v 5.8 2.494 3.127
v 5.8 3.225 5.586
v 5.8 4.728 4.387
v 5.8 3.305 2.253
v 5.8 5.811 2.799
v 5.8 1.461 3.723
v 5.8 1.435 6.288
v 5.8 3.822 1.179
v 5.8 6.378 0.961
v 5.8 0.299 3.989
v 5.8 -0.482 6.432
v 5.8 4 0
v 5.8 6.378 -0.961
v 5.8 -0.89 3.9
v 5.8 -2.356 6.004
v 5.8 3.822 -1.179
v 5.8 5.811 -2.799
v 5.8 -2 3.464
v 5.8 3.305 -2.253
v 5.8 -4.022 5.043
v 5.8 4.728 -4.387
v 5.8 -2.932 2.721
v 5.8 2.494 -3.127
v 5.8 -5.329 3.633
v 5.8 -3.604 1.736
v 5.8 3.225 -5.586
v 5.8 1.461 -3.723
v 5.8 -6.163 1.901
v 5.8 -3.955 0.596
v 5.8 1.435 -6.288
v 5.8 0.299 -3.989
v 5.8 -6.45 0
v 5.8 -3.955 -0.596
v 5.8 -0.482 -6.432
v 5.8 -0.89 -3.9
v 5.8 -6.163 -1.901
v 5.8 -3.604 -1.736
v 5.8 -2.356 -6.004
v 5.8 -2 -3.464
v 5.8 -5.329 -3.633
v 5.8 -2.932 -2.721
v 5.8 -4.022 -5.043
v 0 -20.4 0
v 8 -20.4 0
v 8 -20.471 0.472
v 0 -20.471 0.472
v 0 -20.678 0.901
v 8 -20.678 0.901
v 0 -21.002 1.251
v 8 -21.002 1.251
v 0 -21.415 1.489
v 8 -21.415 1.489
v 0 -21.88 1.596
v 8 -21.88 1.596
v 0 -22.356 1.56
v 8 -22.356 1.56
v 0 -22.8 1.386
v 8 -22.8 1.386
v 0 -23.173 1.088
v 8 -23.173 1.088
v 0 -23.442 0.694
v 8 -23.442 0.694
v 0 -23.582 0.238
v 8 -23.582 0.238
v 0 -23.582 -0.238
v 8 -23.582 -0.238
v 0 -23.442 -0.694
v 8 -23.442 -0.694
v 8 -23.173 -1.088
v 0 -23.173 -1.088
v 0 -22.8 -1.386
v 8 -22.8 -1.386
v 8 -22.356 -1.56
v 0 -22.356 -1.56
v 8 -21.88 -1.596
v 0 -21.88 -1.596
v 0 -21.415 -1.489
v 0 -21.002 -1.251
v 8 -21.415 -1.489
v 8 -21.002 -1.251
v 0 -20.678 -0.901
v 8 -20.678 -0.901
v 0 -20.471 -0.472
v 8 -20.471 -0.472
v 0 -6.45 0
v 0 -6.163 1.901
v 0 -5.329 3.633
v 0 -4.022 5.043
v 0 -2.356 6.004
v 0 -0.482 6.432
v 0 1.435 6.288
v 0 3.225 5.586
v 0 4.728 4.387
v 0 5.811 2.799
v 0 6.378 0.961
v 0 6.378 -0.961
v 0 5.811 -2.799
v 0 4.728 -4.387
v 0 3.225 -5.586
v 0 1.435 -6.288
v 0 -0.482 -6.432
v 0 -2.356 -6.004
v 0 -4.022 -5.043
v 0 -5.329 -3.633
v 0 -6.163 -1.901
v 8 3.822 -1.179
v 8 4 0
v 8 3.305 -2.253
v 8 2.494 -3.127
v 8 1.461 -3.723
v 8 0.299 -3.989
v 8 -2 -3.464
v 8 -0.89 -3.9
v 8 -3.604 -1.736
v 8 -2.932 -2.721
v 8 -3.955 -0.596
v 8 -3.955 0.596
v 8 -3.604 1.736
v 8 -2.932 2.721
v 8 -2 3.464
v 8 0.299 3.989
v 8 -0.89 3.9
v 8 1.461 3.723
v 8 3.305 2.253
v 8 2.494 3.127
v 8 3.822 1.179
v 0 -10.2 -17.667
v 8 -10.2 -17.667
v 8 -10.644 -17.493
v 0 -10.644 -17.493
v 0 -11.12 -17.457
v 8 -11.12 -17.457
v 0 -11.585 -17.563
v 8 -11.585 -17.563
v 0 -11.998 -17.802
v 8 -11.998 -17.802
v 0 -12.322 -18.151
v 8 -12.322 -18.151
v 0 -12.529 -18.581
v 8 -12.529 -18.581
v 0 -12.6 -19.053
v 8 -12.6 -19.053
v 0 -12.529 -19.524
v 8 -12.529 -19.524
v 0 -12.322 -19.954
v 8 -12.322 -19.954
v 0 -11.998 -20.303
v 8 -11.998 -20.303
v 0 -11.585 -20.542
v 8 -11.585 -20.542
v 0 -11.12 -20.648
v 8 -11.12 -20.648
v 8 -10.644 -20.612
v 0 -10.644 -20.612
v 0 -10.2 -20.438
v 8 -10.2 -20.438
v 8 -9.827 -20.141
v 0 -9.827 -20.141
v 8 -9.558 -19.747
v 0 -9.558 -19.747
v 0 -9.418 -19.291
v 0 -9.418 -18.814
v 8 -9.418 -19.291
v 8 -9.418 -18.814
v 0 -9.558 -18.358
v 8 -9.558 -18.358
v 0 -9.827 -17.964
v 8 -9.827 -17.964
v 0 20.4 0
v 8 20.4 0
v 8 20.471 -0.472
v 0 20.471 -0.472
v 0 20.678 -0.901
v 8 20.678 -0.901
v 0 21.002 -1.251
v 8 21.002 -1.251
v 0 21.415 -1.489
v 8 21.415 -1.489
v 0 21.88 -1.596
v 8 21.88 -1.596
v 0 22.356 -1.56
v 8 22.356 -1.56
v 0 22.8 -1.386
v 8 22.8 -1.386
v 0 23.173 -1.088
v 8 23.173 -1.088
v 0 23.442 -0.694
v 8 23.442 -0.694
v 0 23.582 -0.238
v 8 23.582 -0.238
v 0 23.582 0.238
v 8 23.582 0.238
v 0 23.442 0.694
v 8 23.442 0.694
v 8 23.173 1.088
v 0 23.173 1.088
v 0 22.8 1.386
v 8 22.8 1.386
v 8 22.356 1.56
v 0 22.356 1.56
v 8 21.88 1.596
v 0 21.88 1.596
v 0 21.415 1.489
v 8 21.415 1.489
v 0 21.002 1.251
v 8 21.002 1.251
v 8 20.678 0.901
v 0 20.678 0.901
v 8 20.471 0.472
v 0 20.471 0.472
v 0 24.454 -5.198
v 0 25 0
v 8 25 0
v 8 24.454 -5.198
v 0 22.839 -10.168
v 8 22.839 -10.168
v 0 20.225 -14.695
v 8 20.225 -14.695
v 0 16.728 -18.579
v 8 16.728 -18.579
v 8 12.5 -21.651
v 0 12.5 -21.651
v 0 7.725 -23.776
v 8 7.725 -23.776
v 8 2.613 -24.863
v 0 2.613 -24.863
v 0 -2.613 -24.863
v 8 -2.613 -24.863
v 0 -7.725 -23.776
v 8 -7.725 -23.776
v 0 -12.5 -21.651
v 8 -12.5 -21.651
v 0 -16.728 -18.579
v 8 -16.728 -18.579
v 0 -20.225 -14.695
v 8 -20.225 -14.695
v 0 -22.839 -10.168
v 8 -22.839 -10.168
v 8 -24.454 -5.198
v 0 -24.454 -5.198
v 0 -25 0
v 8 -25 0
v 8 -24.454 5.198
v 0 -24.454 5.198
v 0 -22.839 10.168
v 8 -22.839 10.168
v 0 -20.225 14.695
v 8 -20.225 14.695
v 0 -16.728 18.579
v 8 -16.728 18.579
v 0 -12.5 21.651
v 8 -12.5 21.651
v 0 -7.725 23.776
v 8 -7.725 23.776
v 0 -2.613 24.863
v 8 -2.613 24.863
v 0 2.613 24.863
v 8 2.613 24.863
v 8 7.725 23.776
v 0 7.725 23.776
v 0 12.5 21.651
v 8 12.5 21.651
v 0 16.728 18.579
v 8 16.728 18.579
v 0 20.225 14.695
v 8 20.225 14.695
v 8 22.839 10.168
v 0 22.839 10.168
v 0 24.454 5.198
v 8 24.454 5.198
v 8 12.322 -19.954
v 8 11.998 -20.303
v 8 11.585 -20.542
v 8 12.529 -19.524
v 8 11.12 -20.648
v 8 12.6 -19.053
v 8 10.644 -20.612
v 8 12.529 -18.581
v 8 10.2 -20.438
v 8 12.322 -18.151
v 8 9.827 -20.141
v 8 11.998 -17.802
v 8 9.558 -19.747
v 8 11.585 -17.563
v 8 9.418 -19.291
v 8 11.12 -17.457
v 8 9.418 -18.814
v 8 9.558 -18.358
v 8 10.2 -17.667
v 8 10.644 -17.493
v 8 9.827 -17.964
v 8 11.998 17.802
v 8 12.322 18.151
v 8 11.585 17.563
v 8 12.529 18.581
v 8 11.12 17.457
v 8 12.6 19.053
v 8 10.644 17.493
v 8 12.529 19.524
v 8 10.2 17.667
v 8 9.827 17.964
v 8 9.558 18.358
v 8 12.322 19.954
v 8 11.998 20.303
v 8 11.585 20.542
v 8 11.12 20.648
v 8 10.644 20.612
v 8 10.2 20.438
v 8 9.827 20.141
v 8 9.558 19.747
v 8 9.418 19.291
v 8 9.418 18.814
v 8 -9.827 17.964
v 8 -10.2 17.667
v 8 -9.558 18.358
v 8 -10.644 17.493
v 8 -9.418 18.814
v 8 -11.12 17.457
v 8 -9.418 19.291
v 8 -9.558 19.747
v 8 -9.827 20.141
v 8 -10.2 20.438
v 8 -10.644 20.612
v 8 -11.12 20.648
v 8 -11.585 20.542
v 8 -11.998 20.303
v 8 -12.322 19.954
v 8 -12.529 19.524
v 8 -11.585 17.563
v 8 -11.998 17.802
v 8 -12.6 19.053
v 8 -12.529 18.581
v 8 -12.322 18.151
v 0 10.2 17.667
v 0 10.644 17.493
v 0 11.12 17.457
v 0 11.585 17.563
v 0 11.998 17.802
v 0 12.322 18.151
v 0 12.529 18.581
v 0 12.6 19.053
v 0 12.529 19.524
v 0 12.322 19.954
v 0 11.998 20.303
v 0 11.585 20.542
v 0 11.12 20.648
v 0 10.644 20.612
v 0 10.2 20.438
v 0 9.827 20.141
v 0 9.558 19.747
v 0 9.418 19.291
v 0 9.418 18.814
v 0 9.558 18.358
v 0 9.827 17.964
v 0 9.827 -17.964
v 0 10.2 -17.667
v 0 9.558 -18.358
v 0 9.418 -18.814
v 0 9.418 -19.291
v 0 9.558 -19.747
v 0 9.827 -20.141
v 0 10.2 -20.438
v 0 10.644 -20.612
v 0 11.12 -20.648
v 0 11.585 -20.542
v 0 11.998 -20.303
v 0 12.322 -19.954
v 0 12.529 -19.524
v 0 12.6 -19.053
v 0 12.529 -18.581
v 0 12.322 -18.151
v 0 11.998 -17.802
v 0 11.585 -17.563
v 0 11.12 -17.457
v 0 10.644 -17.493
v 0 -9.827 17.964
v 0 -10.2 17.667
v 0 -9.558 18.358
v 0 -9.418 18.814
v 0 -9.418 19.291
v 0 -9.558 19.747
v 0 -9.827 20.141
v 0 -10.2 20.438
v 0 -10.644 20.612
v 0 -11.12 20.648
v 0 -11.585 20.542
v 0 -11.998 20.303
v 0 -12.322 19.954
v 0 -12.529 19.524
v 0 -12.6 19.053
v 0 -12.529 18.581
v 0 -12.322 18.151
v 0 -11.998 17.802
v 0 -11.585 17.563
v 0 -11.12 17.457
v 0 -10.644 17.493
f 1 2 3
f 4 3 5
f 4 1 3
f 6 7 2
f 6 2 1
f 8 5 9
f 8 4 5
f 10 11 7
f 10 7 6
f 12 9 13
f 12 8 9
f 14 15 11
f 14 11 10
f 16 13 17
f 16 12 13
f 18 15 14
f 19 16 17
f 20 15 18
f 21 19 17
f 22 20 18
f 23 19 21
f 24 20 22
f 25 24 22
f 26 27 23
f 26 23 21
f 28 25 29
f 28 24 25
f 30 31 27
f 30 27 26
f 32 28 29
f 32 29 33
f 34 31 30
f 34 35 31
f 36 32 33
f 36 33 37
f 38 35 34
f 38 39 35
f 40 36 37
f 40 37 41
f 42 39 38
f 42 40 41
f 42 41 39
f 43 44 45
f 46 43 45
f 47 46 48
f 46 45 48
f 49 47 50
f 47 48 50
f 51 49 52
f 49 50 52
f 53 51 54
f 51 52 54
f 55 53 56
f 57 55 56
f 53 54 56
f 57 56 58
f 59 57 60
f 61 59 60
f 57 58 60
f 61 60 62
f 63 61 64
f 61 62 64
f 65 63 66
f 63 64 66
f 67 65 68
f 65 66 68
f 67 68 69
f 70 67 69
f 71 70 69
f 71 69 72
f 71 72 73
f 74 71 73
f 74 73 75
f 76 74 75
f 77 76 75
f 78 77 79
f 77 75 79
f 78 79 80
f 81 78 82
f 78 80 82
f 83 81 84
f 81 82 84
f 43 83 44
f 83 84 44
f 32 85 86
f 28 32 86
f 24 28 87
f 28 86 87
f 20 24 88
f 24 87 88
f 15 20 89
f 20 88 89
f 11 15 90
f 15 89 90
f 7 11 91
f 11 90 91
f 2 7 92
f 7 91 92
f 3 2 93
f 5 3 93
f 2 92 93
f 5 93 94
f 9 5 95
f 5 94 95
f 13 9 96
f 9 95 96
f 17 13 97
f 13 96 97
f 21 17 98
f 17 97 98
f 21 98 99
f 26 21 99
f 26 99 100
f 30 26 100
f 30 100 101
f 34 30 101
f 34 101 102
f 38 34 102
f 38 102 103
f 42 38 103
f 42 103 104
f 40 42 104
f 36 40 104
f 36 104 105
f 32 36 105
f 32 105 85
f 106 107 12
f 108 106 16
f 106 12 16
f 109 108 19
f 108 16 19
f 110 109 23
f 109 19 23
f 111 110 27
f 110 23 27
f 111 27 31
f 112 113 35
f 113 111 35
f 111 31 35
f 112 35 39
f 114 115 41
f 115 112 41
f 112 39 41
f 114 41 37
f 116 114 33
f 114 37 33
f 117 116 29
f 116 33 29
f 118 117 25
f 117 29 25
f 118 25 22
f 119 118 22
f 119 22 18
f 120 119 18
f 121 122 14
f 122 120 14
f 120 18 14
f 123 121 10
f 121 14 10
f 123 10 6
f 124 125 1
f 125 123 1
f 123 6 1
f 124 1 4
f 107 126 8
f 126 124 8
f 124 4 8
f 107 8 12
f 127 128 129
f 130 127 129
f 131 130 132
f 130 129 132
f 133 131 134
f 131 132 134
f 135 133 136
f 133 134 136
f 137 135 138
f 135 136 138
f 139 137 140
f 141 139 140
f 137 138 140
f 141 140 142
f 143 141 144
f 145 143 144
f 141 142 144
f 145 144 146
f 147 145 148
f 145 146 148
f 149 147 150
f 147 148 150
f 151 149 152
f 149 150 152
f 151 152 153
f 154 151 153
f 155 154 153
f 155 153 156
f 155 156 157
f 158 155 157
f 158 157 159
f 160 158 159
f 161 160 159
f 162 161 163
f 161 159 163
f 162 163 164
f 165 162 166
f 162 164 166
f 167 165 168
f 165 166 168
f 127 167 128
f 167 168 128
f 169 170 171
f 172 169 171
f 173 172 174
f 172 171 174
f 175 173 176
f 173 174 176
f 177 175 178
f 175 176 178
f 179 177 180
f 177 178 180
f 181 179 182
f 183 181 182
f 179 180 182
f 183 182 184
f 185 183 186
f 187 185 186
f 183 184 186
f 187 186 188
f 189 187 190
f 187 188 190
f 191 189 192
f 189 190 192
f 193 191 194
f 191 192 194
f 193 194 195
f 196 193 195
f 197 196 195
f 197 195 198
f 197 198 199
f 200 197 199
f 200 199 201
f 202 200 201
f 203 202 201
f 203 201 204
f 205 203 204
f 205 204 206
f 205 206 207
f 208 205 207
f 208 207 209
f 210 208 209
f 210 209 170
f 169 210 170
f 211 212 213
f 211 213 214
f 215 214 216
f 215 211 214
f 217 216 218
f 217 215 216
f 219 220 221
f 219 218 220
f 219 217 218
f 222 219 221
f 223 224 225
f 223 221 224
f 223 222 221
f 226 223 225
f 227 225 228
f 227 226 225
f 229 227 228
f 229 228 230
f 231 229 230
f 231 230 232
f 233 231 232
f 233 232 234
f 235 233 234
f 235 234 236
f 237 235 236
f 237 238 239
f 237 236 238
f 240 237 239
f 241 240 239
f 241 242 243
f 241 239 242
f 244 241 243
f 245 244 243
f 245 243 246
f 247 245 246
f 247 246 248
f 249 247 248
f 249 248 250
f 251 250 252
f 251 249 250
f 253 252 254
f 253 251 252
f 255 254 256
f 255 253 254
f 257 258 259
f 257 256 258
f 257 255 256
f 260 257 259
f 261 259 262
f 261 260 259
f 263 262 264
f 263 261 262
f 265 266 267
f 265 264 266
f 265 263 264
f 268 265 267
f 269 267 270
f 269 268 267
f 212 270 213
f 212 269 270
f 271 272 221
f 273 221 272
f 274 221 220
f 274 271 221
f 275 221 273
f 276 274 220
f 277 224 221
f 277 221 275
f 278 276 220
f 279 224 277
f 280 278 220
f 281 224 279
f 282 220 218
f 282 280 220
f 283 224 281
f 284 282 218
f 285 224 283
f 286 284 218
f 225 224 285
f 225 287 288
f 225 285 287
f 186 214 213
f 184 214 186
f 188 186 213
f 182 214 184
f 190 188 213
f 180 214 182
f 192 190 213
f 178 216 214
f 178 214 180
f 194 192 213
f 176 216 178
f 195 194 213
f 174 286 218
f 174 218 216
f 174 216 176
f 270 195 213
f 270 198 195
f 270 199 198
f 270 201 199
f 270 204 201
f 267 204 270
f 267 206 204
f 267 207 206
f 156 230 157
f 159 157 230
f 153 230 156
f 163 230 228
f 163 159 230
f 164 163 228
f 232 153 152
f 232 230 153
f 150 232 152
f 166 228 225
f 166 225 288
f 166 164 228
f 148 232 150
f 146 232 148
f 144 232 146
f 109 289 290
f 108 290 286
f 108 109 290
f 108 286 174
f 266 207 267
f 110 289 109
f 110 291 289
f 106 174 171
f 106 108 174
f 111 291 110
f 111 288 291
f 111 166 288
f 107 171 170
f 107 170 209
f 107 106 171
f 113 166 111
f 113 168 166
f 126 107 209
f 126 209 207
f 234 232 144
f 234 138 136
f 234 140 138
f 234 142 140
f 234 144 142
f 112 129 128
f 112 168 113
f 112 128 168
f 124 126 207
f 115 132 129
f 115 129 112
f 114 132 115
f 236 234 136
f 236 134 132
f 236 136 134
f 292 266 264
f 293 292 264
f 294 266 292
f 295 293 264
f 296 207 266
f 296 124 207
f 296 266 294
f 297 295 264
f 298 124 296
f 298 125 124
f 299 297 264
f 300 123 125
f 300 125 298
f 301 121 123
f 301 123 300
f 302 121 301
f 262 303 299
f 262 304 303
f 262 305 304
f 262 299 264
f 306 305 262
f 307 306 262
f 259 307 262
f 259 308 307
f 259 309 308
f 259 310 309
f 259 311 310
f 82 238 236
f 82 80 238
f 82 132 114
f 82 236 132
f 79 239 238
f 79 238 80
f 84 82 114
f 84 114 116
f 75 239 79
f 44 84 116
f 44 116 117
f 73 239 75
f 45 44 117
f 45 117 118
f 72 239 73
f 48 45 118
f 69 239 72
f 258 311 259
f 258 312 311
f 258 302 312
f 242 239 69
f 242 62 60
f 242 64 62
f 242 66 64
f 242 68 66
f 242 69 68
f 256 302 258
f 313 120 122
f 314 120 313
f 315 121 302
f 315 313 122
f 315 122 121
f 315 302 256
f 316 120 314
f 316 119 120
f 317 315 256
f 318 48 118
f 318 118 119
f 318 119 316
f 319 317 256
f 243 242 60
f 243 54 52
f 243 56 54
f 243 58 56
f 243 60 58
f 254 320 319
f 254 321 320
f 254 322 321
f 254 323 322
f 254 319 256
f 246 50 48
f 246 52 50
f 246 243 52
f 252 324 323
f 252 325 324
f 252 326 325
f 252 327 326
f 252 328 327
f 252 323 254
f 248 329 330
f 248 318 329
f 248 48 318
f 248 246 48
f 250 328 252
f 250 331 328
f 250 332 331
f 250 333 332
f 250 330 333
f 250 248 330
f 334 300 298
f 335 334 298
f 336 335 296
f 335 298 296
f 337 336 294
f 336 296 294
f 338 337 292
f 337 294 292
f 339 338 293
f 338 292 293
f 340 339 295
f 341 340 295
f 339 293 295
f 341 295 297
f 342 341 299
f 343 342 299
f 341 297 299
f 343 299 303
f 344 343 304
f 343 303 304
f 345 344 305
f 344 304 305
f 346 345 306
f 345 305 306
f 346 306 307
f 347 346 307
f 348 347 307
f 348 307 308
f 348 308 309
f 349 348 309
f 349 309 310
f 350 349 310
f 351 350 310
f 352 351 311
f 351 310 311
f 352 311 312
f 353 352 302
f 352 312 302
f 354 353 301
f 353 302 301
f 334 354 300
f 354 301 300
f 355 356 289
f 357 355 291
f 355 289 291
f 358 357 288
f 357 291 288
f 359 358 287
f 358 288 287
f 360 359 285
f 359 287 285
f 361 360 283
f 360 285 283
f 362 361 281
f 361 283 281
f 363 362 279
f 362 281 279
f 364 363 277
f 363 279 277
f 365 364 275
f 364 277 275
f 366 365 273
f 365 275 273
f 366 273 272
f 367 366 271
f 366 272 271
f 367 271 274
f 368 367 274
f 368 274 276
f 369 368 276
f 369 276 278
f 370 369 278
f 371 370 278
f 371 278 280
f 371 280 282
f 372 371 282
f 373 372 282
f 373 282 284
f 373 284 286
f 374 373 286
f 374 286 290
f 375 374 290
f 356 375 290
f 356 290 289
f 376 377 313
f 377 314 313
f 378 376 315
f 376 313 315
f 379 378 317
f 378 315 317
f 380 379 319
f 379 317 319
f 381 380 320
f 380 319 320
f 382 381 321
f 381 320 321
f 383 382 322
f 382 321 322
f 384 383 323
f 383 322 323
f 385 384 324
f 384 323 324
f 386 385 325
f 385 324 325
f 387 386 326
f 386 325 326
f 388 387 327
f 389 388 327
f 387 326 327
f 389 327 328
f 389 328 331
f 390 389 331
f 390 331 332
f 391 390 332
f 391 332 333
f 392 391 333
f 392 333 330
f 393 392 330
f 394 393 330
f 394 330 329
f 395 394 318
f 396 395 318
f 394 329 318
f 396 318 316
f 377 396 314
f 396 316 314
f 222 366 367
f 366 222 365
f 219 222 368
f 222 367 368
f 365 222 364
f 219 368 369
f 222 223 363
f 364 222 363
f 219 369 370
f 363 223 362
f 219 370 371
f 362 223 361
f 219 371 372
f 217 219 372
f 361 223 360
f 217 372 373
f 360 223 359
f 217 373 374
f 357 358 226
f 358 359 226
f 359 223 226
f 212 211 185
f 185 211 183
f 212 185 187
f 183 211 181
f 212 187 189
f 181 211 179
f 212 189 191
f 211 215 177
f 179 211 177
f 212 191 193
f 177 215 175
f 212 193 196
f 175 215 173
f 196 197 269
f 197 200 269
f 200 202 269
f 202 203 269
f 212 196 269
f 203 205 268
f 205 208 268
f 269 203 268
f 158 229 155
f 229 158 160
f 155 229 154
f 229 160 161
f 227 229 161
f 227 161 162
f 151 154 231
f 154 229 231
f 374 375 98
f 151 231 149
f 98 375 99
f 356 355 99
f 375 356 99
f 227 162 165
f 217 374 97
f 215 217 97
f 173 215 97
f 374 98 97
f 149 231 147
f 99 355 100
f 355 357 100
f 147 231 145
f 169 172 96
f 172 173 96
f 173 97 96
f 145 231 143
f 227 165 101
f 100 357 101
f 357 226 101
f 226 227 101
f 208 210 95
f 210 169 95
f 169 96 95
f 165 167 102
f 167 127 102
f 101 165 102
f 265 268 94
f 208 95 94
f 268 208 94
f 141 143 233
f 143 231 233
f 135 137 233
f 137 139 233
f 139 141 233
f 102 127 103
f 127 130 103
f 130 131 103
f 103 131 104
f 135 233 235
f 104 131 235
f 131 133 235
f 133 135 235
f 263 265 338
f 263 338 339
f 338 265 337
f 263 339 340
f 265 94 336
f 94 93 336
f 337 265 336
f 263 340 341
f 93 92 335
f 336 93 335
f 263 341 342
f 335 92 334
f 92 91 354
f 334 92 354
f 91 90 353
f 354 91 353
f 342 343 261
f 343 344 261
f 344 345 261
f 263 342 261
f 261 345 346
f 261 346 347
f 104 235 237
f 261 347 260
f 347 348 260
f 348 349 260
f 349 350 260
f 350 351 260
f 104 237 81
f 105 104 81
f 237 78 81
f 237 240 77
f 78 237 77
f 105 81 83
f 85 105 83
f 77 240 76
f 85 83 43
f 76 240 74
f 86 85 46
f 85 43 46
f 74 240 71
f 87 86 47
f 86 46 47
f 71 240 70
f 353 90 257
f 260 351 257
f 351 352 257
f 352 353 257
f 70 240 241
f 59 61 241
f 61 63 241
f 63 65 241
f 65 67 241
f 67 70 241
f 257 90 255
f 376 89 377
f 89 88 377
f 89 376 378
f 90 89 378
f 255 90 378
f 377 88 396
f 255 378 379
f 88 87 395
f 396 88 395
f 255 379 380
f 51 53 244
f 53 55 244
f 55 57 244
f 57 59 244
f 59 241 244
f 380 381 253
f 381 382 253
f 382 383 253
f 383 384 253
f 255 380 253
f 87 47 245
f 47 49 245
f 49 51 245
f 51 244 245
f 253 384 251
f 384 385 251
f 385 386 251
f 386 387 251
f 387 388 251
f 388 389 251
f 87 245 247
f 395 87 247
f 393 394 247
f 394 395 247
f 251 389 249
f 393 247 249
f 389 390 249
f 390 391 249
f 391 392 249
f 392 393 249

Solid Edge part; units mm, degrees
sketch "Sketch1" plane through (0, 0, 0) normal (1, 0, 0) x (0, 1, 0)
  circle A0 centre (0, 0) radius 4
  circle A1 centre (0, 0) radius 25
extrude "Protrusion1" add sketch "Sketch1" along normal blind 8
sketch "Sketch2" plane through (0, 0, 0) normal (-1, 0, 0) x (0, -1, 0)
  circle A0 centre (0, 0) radius 6.45
extrude "ExtrudedCutout_1" cut sketch "Sketch2" against normal blind 5.8
sketch "Sketch3" plane through (8, 0, 0) normal (1, 0, 0) x (0, 1, 0)
  circle A0 centre (-22, 0) radius 1.6
  dimension "D1" = 22
extrude "Cutout1" cut sketch "Sketch3" against normal up to next
pattern_circular "Pattern1" count 6 over 360 about axis through (8, 0, 0) along (-1, 0, 0) of "Cutout1"
